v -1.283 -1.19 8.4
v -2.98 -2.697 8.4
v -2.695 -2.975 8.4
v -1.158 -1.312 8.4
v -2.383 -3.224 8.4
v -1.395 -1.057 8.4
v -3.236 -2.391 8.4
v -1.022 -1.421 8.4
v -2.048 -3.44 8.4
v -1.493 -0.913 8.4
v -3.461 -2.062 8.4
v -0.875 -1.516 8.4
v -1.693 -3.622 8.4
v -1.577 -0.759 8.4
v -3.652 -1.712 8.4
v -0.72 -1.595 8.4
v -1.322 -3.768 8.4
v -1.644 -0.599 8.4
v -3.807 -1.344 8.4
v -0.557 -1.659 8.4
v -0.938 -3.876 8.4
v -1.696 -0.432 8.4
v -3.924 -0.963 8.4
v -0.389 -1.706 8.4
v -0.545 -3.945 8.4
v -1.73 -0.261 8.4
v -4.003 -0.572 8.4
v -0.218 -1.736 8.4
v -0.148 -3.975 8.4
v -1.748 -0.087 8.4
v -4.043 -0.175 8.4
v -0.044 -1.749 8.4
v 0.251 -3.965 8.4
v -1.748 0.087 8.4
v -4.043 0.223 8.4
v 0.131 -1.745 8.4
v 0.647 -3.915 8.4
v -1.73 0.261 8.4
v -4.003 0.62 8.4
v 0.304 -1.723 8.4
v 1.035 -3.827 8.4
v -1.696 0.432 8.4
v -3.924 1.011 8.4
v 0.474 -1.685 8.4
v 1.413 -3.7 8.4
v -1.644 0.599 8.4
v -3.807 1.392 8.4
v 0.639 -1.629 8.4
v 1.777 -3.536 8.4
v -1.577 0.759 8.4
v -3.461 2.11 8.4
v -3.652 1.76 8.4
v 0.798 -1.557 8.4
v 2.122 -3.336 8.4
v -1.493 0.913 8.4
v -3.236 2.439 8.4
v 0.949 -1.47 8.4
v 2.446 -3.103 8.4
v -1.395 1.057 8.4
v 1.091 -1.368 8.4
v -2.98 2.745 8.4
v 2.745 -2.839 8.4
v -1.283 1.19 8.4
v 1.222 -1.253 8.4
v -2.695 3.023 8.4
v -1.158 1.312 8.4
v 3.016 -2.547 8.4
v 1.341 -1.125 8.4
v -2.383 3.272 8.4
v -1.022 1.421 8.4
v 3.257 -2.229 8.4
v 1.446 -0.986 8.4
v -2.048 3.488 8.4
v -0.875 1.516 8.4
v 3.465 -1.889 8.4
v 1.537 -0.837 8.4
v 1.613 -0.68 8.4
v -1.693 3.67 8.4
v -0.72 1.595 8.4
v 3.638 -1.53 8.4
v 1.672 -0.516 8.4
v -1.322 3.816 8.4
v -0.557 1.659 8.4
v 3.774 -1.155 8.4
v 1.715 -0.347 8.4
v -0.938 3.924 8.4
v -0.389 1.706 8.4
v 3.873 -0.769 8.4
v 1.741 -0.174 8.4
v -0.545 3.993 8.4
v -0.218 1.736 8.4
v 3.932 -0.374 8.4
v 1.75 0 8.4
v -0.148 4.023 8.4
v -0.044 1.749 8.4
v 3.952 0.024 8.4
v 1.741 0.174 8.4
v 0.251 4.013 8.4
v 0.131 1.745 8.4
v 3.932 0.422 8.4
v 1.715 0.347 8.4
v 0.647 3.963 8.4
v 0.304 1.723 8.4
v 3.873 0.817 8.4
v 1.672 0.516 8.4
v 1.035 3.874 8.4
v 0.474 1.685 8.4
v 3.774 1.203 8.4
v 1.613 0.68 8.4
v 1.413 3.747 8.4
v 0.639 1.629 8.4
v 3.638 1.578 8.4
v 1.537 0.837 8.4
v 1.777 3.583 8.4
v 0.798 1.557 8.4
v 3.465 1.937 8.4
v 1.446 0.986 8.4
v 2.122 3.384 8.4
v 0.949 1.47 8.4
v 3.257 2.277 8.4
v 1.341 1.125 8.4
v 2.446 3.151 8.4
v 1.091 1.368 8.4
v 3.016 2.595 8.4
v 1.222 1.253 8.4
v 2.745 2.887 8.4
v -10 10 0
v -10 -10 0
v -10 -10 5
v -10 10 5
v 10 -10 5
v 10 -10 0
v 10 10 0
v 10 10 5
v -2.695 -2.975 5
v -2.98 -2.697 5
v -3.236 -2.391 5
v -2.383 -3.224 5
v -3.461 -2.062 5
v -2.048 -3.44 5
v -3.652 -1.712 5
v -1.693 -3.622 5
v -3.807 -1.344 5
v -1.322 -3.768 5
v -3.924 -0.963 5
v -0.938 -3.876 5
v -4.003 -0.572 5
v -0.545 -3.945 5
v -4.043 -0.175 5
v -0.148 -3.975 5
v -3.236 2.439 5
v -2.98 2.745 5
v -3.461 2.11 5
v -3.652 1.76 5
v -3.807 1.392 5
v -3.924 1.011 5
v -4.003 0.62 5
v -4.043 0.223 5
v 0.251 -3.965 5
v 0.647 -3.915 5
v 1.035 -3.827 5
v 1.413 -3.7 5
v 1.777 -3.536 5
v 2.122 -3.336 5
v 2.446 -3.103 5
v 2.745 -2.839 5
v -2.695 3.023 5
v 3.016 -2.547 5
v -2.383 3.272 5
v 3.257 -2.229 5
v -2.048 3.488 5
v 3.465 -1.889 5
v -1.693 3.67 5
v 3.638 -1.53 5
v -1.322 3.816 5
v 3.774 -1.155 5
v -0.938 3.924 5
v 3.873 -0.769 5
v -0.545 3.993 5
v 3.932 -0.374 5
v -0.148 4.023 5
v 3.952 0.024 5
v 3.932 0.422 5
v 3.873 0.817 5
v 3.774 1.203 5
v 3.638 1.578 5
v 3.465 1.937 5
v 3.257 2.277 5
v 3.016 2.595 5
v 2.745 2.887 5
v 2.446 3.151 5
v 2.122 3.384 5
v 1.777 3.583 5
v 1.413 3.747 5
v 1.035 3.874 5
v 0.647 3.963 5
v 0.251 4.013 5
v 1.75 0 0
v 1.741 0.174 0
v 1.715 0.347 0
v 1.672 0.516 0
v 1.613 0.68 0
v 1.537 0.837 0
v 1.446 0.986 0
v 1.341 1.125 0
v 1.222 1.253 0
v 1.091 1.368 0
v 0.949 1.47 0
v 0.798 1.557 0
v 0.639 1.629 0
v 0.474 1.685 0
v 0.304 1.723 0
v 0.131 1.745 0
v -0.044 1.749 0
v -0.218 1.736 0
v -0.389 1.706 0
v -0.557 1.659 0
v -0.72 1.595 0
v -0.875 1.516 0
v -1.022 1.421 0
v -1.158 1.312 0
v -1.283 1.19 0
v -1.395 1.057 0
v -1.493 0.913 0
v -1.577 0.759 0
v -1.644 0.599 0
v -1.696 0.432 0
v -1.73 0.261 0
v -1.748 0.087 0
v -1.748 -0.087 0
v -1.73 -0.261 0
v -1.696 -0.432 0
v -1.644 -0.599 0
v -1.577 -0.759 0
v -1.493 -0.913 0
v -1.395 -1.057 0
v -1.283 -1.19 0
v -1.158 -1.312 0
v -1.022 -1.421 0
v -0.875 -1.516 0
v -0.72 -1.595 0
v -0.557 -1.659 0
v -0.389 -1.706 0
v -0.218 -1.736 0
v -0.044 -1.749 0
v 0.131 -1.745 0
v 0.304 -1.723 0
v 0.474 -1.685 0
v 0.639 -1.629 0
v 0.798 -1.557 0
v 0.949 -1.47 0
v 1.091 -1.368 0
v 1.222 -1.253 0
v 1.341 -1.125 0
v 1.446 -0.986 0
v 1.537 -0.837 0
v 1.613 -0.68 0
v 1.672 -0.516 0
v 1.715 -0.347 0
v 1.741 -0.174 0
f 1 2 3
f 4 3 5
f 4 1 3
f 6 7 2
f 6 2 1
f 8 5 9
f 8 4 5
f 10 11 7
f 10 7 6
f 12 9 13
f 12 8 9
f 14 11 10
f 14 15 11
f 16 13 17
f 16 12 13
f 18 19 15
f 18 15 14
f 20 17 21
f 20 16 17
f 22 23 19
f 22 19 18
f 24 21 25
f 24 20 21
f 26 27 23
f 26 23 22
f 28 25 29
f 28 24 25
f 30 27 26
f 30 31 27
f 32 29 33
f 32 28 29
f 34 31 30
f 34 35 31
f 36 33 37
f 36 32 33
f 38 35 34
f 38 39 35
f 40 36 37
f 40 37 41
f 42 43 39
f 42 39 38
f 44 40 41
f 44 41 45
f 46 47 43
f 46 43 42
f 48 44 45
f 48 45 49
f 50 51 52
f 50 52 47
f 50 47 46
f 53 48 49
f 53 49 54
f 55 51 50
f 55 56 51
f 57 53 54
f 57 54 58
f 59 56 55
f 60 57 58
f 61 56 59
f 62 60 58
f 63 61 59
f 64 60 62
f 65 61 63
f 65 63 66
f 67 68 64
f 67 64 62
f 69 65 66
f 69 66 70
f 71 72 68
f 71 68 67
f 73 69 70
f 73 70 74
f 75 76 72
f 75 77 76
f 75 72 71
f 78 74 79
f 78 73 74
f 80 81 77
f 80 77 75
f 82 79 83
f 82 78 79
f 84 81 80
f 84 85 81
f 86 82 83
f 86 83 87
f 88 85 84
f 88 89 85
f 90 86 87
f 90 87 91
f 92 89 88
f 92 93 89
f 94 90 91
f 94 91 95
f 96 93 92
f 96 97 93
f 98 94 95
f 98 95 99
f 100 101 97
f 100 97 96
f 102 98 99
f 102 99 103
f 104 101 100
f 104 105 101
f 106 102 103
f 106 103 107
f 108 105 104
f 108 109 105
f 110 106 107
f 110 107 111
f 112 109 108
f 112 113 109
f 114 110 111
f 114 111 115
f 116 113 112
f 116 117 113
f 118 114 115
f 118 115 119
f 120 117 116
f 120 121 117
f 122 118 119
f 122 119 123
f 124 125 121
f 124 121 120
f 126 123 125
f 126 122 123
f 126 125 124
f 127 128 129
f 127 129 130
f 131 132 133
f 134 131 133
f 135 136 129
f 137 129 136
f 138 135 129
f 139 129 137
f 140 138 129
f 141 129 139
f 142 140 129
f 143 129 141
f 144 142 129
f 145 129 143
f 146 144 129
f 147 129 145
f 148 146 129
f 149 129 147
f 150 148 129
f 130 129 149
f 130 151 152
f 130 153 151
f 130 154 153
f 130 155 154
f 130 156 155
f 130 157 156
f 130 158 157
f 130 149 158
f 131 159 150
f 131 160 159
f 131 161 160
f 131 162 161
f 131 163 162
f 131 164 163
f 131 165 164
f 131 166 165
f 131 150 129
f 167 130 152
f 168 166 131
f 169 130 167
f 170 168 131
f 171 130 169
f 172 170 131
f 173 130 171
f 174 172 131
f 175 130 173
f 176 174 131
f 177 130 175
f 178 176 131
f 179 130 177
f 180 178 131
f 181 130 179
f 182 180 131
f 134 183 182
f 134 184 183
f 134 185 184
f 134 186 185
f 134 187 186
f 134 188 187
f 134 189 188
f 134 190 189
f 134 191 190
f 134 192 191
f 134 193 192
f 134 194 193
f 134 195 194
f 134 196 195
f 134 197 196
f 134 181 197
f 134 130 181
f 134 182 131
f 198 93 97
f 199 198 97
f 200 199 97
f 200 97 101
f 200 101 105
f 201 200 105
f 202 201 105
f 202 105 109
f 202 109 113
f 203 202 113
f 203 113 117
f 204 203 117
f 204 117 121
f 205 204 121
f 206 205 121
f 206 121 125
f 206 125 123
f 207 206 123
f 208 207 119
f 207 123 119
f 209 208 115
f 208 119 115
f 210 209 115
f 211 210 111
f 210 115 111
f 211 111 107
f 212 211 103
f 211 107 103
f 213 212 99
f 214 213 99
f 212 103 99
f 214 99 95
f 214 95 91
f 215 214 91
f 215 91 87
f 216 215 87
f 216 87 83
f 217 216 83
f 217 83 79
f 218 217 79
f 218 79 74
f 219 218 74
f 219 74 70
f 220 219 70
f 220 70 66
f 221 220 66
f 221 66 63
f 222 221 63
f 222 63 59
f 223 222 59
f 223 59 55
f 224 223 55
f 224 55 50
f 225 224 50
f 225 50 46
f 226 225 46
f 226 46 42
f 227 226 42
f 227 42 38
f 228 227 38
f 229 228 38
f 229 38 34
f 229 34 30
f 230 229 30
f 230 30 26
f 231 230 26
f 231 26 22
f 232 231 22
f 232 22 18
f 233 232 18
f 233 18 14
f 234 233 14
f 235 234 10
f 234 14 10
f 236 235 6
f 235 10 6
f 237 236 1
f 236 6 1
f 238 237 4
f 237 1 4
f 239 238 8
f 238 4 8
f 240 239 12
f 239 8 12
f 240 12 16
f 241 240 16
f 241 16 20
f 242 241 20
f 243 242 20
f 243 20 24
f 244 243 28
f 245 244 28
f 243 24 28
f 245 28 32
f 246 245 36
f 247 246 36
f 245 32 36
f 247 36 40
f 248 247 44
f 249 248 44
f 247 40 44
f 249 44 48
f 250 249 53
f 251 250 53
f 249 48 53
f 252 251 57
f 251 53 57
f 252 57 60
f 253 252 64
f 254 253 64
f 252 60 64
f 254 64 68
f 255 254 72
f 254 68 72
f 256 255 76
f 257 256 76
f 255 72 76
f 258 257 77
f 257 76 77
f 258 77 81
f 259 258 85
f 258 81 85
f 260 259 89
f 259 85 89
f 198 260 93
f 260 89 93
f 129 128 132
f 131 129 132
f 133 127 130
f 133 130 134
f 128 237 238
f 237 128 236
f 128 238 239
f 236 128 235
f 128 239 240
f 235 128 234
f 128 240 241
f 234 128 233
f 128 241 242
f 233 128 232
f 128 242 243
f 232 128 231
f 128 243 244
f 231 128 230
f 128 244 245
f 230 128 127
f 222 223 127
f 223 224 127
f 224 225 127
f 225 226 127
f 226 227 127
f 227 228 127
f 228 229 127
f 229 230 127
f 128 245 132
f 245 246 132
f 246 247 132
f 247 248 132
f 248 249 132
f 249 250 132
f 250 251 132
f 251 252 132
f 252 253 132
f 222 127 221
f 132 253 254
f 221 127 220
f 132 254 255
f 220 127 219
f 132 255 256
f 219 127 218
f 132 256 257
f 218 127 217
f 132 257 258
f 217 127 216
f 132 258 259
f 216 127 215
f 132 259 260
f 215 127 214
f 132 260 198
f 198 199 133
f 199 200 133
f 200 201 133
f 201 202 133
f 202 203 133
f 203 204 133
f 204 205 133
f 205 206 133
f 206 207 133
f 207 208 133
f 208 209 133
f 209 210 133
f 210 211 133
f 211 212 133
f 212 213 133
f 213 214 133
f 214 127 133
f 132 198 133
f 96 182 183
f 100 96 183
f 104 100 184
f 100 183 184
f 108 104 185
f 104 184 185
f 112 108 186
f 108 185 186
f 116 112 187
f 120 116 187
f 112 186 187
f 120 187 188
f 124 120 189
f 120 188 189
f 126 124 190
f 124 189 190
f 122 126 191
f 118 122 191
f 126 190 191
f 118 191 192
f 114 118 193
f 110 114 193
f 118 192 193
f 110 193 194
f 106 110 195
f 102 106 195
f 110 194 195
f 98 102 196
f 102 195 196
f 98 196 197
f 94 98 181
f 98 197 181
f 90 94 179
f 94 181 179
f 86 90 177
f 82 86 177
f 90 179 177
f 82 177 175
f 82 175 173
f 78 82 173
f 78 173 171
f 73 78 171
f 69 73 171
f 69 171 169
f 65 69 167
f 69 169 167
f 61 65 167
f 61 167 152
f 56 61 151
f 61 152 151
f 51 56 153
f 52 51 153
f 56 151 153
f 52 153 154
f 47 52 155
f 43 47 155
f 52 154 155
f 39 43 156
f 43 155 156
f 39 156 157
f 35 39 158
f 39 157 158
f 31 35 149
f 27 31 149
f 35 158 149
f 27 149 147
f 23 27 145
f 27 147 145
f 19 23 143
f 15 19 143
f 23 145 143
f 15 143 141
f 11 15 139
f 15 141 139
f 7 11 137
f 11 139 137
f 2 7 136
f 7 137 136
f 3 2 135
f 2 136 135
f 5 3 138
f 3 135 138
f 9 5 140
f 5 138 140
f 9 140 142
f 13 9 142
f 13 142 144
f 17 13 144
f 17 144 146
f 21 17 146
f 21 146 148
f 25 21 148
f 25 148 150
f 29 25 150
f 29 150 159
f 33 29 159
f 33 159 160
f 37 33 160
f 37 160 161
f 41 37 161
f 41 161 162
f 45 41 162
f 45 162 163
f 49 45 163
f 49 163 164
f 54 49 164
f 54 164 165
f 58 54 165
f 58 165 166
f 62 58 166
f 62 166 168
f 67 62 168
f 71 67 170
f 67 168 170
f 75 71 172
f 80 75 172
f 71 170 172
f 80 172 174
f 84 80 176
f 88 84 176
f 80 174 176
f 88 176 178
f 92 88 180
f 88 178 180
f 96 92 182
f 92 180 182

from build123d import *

# Parameters (mm, degrees)
SKETCH_W     = 20
SKETCH_H     = 20
PAD_DEPTH    = 5
SKETCH001_R  = 4
PAD001_DEPTH = 3.4
SKETCH002_R  = 1.75
POCKET_DEPTH = 8.401


with BuildPart() as part:
    # Sketch → Pad (new body)
    with BuildSketch(Plane.XY):
        Rectangle(SKETCH_W, SKETCH_H)
    extrude(amount=PAD_DEPTH)

    # Sketch001 → Pad001 (new body)
    with BuildSketch(Plane.XY.offset(5)):
        with Locations((-0.047954, 0.023977)):
            Circle(SKETCH001_R)
    extrude(amount=PAD001_DEPTH)

    # Sketch002 → Pocket (cut, through all)
    with BuildSketch(Plane.XY.offset(8.4)):
        Circle(SKETCH002_R)
    extrude(amount=-POCKET_DEPTH, mode=Mode.SUBTRACT)


solid = part.part
